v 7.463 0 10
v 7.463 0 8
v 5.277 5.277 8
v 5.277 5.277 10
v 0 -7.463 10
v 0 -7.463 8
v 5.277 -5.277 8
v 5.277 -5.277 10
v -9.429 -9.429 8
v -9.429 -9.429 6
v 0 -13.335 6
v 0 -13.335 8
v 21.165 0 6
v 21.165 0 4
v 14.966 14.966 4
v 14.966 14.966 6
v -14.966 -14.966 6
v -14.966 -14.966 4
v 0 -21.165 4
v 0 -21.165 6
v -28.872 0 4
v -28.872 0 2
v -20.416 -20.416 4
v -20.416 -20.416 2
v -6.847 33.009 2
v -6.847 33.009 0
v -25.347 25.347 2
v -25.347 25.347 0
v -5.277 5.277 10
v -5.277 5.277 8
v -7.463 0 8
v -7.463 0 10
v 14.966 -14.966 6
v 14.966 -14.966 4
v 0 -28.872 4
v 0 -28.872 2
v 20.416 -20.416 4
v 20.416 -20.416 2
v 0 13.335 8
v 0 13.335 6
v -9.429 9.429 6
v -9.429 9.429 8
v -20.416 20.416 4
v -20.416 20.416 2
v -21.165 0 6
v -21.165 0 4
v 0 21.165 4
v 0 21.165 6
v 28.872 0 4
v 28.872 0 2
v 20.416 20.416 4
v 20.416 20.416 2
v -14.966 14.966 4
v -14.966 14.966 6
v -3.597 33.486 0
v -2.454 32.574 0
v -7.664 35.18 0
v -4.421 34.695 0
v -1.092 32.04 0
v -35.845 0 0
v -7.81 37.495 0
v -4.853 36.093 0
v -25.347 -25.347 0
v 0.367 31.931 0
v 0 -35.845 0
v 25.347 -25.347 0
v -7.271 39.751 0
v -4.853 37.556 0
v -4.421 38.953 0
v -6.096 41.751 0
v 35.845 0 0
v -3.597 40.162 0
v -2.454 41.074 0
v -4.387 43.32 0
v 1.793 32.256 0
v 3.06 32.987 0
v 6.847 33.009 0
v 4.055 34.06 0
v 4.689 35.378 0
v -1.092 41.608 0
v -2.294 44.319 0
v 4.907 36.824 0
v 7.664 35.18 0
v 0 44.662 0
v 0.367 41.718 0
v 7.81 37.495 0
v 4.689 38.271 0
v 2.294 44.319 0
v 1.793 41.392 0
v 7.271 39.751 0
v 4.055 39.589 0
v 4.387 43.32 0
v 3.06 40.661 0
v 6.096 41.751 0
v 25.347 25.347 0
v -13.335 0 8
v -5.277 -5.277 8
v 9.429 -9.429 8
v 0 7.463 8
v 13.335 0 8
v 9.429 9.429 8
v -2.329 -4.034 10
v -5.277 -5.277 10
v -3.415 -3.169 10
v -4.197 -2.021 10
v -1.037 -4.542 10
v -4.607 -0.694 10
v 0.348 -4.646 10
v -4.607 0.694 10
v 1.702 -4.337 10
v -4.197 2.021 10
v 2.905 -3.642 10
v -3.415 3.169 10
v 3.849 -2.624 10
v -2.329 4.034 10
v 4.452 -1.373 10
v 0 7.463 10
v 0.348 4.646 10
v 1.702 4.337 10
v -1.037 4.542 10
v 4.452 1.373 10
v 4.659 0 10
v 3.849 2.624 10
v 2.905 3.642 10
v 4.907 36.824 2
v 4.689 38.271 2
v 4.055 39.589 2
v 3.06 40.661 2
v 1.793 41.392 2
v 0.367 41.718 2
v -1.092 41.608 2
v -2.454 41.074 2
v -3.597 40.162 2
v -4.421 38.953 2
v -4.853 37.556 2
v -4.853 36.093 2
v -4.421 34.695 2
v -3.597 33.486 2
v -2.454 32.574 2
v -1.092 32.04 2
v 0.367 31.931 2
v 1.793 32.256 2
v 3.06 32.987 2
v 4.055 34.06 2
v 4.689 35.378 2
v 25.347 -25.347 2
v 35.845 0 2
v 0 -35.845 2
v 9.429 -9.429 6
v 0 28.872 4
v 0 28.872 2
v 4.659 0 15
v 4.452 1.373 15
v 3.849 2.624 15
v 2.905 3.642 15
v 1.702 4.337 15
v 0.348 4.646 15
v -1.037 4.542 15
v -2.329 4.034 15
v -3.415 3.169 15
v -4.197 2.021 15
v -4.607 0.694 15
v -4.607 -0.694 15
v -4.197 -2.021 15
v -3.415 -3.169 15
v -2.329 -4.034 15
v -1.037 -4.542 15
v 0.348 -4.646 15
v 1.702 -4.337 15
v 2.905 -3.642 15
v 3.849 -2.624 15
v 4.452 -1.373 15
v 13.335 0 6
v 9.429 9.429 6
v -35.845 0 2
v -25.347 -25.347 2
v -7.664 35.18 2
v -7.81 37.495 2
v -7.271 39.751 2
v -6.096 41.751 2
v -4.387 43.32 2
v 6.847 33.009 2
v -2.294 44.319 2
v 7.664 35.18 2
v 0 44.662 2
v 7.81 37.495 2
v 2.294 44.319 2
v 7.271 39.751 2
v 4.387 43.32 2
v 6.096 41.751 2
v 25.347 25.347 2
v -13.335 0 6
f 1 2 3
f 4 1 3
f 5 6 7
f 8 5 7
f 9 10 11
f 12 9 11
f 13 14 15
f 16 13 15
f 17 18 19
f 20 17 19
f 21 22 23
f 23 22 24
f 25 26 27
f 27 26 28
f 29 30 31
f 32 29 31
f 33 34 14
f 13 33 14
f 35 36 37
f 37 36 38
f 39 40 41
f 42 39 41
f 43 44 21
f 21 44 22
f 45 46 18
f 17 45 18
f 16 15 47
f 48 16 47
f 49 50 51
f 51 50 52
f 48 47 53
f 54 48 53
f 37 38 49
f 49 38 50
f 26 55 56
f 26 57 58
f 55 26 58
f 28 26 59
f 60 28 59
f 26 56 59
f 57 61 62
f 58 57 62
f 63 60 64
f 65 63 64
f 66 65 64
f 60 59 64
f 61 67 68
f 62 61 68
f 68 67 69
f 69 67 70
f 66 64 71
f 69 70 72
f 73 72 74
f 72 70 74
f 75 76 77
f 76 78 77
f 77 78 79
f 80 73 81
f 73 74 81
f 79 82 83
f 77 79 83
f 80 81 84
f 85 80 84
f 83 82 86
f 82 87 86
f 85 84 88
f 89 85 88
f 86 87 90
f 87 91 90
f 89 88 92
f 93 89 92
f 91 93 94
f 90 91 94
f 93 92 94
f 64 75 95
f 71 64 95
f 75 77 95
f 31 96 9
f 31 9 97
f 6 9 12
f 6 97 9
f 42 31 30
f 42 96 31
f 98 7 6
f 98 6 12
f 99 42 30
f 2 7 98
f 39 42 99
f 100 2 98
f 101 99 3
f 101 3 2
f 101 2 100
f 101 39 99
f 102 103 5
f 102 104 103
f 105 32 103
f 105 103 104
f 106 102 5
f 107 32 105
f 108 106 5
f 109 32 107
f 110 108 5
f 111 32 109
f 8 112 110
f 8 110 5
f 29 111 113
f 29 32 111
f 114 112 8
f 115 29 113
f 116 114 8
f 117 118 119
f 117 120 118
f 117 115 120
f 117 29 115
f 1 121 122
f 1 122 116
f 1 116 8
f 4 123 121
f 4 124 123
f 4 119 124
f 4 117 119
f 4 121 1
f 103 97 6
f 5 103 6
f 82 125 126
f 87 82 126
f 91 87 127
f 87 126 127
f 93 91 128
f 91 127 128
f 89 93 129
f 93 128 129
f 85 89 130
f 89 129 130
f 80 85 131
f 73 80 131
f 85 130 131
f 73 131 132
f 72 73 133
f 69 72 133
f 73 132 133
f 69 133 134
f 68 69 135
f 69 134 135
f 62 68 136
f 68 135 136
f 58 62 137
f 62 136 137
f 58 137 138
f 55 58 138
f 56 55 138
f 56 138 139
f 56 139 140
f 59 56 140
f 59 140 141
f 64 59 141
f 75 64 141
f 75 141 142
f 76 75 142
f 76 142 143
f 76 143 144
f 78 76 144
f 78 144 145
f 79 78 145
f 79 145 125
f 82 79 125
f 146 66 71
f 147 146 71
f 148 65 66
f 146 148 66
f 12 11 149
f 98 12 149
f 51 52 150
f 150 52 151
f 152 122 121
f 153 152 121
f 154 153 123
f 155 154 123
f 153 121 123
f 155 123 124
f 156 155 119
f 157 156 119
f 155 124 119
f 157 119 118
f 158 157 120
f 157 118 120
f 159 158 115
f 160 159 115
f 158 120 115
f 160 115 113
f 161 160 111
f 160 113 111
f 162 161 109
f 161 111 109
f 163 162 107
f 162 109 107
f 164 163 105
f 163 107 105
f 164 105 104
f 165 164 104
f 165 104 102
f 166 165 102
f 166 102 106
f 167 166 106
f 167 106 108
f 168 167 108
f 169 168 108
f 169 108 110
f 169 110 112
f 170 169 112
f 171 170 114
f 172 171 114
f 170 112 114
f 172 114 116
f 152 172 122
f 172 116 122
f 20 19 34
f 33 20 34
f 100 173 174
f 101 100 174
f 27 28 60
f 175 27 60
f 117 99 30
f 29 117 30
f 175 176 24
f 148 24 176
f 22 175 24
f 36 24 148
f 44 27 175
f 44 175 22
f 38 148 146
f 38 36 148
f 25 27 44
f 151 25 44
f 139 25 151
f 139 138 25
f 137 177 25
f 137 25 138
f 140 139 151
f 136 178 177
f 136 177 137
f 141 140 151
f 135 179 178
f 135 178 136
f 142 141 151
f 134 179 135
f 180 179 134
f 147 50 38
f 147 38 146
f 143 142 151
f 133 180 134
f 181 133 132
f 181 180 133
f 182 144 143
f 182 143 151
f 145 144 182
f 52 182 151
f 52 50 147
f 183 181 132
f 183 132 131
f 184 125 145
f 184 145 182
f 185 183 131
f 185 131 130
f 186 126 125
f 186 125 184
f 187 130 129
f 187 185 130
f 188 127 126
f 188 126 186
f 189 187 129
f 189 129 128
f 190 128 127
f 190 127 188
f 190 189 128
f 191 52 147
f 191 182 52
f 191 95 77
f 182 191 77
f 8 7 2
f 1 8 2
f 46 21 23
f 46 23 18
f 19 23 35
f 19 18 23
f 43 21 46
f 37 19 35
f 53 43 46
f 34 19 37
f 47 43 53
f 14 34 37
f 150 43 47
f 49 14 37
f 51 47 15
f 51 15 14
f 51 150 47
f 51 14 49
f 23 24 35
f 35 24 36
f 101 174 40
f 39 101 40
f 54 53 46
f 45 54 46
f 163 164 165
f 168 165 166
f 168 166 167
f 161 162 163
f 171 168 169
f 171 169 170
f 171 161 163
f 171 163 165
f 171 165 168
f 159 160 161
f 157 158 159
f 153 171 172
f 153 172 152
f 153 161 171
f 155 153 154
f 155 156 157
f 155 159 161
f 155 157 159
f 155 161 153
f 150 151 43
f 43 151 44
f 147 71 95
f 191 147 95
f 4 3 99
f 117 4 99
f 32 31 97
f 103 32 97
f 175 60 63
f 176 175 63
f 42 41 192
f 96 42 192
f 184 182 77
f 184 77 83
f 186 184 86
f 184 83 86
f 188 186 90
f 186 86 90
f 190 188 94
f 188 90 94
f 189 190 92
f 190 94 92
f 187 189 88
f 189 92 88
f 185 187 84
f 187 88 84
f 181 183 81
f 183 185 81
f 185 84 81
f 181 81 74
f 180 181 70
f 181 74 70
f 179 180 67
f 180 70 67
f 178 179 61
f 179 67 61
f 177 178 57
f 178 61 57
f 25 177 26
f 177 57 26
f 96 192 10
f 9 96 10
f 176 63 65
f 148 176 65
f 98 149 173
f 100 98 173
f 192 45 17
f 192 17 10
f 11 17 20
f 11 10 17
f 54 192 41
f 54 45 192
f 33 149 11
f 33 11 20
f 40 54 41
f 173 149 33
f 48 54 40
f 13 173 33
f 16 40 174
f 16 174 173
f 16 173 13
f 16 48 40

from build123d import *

# Parameters (mm, degrees)
F1_DEPTH  = 2
F3_DEPTH  = 2
F5_DEPTH  = 2
F7_DEPTH  = 2
F9_DEPTH  = 2
F10_R     = 7.838323
F11_DEPTH = 2
F12_R     = 4.907322
F13_DEPTH = 25.4
F14_R     = 4.658547
F15_DEPTH = 5


with BuildPart() as f1:
    # F0 (on Top) → F1 (new body)
    with BuildSketch(Plane.XY):
        Polygon((25.346567, 25.346567), (0, 35.845459), (-25.346567, 25.346567), (-35.845459, 0), (-25.346567, -25.346567), (0, -35.845459), (25.346567, -25.346567), (35.845459, 0), align=None)
    extrude(amount=F1_DEPTH)

    # F2 (on face) → F3 (join)
    with BuildSketch(Plane.XY.offset(2)):
        Polygon((20.415665, 20.415665), (0, 28.87211), (-20.415665, 20.415665), (-28.87211, 0), (-20.415665, -20.415665), (0, -28.87211), (20.415665, -20.415665), (28.87211, 0), align=None)
    extrude(amount=F3_DEPTH)

    # F4 (on face) → F5 (join)
    with BuildSketch(Plane.XY.offset(4)):
        Polygon((14.96572, 14.96572), (0, 21.164725), (-14.96572, 14.96572), (-21.164725, 0), (-14.96572, -14.96572), (0, -21.164725), (14.96572, -14.96572), (21.164725, 0), align=None)
    extrude(amount=F5_DEPTH)

    # F6 (on face) → F7 (join)
    with BuildSketch(Plane.XY.offset(6)):
        Polygon((9.429269, 9.429269), (0, 13.335001), (-9.429269, 9.429269), (-13.335001, 0), (-9.429269, -9.429269), (0, -13.335001), (9.429269, -9.429269), (13.335001, 0), align=None)
    extrude(amount=F7_DEPTH)

    # F8 (on face) → F9 (join)
    with BuildSketch(Plane.XY.offset(8)):
        Polygon((5.27693, 5.27693), (0, 7.462706), (-5.27693, 5.27693), (-7.462706, 0), (-5.27693, -5.27693), (0, -7.462706), (5.27693, -5.27693), (7.462706, 0), align=None)
    extrude(amount=F9_DEPTH)

    # F10 (on Top) → F11 (join)
    with BuildSketch(Plane.XY):
        with Locations((0, 36.824174)):
            Circle(F10_R)
    extrude(amount=F11_DEPTH)

    # F12 (on face) → F13 (cut)
    with BuildSketch(Plane.XY.offset(2)):
        with Locations((0, 36.824174)):
            Circle(F12_R)
    extrude(amount=-F13_DEPTH, mode=Mode.SUBTRACT)

    # F14 (on face) → F15 (join)
    with BuildSketch(Plane.XY.offset(10)):
        Circle(F14_R)
    extrude(amount=F15_DEPTH)


solid = f1.part
